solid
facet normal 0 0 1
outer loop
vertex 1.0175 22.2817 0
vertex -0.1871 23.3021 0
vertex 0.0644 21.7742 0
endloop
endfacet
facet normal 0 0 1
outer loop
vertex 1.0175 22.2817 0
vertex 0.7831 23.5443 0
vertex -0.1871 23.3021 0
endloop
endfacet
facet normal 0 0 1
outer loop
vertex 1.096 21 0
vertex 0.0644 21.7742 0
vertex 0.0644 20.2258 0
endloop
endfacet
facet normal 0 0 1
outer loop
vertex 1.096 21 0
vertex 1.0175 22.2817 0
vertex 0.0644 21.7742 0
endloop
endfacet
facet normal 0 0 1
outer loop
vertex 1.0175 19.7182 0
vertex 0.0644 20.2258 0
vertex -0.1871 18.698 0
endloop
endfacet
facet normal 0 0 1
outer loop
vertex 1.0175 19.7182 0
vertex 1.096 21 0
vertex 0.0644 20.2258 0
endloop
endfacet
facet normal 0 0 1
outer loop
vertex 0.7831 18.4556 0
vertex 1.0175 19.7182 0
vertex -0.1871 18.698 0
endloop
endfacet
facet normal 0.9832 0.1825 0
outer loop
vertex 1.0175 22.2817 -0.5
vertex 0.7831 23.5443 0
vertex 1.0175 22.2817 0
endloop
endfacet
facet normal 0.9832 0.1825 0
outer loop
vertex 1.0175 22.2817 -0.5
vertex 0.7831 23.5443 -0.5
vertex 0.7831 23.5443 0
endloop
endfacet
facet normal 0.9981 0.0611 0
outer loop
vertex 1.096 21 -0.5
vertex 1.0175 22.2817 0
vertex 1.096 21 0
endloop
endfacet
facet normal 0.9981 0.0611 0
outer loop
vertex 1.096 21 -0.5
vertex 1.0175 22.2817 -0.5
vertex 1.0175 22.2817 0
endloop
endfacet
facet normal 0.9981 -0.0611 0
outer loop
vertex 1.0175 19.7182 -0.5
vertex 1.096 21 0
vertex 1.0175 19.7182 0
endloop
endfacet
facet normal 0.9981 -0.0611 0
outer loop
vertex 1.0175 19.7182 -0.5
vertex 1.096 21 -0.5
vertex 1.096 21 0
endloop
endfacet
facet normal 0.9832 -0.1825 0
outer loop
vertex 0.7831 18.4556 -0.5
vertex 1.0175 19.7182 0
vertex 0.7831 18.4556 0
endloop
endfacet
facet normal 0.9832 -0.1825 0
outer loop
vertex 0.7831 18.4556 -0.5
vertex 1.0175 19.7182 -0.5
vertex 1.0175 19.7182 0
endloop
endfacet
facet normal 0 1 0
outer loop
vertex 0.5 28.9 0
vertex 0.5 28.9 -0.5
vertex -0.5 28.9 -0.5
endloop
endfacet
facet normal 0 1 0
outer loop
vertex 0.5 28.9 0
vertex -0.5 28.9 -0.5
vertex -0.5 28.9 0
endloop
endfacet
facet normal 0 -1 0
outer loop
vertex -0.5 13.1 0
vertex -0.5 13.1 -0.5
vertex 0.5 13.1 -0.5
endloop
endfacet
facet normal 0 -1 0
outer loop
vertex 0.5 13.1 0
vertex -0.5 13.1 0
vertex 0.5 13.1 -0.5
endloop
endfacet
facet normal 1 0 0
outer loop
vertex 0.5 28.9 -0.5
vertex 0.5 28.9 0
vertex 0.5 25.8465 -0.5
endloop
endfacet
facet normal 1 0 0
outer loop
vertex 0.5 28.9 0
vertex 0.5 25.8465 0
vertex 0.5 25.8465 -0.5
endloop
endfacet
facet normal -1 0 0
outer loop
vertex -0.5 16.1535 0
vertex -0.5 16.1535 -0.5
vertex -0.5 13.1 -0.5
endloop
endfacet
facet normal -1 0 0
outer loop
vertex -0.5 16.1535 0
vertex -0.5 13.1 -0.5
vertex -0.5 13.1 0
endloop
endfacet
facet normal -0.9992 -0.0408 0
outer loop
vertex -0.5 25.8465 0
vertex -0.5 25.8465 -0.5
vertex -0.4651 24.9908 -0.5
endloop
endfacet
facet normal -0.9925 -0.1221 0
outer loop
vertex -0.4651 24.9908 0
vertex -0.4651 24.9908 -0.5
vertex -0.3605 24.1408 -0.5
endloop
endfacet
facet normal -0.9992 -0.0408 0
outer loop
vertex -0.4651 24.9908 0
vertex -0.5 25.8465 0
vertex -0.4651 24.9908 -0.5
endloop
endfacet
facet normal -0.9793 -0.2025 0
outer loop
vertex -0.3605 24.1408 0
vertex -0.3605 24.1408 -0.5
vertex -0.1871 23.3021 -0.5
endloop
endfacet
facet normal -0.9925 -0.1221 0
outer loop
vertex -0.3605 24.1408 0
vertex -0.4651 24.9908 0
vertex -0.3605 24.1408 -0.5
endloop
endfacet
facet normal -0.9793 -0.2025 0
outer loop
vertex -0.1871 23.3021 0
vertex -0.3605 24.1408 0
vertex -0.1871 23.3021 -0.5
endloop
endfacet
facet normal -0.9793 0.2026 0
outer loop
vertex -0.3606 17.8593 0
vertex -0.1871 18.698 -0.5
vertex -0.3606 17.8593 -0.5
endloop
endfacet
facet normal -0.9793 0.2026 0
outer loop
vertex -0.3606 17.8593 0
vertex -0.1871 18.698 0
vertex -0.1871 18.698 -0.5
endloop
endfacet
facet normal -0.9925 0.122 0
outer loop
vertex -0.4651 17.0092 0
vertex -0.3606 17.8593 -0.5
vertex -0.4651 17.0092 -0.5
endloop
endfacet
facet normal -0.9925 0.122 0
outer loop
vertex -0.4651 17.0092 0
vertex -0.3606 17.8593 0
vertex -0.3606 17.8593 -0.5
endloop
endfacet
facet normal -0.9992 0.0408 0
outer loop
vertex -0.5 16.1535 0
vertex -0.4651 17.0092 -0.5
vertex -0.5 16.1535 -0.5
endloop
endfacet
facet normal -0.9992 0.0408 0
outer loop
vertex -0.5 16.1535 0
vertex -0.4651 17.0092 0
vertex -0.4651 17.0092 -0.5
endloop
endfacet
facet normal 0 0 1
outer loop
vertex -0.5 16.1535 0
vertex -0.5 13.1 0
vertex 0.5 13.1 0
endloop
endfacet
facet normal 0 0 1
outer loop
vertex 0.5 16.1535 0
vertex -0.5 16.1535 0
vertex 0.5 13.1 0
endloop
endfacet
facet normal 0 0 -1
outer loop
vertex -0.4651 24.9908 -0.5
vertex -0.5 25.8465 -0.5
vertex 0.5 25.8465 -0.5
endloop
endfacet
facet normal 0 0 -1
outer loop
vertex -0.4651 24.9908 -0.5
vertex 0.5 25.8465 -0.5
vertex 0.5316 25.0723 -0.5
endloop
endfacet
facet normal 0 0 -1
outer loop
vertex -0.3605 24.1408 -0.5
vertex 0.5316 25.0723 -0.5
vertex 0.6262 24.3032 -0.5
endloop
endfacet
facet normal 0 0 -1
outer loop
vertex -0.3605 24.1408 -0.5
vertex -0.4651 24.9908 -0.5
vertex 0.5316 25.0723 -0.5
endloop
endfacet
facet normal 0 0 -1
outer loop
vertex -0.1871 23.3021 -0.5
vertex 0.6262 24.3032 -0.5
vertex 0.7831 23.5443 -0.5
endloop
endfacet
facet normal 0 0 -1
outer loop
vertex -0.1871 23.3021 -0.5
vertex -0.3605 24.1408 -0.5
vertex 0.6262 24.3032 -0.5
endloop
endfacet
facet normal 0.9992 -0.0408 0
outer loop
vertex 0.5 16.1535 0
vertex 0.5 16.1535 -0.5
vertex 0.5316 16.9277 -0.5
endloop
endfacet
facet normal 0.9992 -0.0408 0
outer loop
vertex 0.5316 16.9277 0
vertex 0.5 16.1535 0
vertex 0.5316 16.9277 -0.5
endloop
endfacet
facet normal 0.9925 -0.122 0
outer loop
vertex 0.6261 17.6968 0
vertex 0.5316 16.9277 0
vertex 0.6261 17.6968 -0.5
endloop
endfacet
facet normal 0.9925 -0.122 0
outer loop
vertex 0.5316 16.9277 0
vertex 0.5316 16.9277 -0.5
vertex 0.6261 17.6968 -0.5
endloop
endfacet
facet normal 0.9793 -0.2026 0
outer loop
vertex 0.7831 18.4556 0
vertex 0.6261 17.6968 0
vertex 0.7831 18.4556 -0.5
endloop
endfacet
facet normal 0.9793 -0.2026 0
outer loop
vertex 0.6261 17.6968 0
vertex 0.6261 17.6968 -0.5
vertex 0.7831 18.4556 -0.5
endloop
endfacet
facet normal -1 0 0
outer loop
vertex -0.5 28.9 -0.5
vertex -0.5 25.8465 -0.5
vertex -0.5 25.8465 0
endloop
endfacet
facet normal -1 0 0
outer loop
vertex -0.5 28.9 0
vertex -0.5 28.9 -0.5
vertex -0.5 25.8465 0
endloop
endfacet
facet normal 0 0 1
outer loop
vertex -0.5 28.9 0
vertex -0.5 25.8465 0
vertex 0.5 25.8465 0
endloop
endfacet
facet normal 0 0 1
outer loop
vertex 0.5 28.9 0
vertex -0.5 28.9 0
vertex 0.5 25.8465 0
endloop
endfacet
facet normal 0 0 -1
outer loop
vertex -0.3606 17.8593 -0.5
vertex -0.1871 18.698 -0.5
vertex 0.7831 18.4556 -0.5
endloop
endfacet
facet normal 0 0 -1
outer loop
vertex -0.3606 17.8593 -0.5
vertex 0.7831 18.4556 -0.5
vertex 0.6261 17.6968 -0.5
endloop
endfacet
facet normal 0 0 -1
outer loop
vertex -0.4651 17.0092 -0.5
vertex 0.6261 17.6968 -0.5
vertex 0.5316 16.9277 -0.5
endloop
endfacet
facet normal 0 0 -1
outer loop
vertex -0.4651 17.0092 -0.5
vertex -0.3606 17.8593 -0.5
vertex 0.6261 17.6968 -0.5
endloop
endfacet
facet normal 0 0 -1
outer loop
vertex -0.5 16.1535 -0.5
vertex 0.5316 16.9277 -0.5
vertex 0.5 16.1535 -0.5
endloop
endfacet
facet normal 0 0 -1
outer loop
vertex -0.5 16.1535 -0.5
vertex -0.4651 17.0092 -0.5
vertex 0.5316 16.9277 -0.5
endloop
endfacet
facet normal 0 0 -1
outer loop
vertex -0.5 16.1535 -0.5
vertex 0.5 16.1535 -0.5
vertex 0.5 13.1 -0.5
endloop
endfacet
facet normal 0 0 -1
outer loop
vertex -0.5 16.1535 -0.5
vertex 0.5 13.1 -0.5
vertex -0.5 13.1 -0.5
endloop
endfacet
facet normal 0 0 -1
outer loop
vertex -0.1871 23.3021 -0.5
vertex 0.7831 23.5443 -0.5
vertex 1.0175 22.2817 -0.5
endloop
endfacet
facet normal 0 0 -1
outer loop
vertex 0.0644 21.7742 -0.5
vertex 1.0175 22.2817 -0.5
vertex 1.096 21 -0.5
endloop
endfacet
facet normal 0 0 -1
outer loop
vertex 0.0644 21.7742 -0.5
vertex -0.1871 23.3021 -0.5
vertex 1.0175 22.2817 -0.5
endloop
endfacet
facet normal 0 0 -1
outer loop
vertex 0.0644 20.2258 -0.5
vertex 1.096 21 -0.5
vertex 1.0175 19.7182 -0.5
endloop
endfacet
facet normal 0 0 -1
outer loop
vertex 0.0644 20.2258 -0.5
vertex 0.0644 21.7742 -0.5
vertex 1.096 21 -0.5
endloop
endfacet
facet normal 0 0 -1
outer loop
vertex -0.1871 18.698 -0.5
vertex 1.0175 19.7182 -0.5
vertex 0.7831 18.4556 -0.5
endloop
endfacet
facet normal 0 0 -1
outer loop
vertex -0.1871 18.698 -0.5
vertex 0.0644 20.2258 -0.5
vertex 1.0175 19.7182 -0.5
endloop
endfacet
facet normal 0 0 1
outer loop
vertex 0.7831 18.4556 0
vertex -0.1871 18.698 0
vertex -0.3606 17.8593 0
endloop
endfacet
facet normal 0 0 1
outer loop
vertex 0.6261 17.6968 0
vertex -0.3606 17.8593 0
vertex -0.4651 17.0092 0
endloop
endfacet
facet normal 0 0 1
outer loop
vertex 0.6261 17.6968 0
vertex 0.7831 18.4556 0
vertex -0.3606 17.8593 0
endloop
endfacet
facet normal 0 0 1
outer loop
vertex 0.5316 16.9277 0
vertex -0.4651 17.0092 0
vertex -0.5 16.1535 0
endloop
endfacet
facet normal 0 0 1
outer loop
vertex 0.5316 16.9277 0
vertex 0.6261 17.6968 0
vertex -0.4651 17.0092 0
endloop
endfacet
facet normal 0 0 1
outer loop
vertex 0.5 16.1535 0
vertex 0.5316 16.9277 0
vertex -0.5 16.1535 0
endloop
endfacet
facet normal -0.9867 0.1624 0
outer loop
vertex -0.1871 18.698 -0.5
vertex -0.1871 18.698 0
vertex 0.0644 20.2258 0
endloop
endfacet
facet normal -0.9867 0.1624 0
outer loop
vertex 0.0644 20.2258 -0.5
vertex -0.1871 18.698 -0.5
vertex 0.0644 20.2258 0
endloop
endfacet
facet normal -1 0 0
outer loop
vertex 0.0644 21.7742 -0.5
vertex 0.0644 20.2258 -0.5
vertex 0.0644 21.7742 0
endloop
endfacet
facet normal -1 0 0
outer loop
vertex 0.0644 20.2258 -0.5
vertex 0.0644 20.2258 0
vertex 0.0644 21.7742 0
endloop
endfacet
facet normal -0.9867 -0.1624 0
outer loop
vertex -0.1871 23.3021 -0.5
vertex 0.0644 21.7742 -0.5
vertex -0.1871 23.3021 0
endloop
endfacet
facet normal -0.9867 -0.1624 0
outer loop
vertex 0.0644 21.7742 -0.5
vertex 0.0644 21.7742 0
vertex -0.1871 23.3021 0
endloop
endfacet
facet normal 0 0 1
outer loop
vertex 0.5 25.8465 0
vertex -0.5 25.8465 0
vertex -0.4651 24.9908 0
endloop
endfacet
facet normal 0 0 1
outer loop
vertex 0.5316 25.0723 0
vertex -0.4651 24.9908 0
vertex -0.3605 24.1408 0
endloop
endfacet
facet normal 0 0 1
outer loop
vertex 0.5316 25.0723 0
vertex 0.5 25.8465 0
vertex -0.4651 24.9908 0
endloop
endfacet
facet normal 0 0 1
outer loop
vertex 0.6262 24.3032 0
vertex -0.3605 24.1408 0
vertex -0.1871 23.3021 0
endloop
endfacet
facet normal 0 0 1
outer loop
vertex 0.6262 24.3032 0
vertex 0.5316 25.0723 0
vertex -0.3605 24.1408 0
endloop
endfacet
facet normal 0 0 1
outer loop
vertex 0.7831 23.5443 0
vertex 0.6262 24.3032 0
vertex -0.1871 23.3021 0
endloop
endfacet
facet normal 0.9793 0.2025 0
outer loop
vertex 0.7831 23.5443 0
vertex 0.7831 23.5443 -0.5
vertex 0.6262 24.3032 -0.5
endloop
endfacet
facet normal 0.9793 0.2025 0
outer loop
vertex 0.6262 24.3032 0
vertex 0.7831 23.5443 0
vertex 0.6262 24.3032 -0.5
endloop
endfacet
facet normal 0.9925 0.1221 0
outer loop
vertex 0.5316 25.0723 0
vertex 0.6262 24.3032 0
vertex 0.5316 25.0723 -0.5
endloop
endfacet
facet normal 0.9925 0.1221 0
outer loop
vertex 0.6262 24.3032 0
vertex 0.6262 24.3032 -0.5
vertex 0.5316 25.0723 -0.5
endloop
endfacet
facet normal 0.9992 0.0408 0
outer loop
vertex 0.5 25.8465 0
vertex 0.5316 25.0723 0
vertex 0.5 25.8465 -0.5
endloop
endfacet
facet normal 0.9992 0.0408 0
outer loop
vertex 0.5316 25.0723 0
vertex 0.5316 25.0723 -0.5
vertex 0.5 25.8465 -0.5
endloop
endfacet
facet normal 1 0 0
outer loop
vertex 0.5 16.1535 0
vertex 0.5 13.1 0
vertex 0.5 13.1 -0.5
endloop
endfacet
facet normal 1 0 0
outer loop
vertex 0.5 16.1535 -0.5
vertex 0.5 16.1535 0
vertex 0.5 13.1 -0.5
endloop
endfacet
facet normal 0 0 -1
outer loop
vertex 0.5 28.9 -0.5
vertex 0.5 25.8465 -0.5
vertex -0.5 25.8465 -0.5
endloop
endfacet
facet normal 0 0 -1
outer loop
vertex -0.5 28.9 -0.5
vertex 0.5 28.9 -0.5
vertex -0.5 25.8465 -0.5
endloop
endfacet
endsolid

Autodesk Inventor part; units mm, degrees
ref_plane "YZ Plane" through (0, 0, 0) normal (1, 0, 0) x (0, 1, 0)
ref_plane "XY Plane" through (0, 0, 0) normal (0, 0, 1) x (1, 0, 0)
sketch "Sketch1" plane through (0, 0, 0) normal (0, 0, 1) x (1, 0, 0)
  line L0 (0.9, 49.1) -> (0.9, 28.9) projected
  arc A0 (0.9, 49.1) -> (-0.9, 49.1) centre (0, 49.1) ccw projected
  line L1 (-0.9, 28.9) -> (-0.9, 49.1) projected
  arc A1 (-0.9, 28.9) -> (0.9, 28.9) centre (0, 28.9) ccw projected
  line L2 (0.9, 13.1) -> (0.9, -13.1) projected
  arc A2 (0.9, 13.1) -> (-0.9, 13.1) centre (0, 13.1) ccw projected
  line L3 (-0.9, -13.1) -> (-0.9, 13.1) projected
  arc A3 (-0.9, -13.1) -> (0.9, -13.1) centre (0, -13.1) ccw projected
  line L4 (0, 28.9) -> (0, 25.8465)
  arc A4 (0, 25.8465) -> (0.298, 23.4232) centre (10, 25.8465) ccw
  arc A5 (0.298, 18.5768) -> (0.298, 23.4232) centre (-9.4039, 21) ccw
  arc A6 (0.298, 18.5768) -> (0, 16.1535) centre (10, 16.1535) ccw
  line L5 (0, 16.1535) -> (0, 13.1)
  point P0 (0, 0)
  dimension "d0" = 10
  dimension "d1" = 10
ref_plane "Work Plane1" through (0, 28.9, 0) normal (0, 1, 0) x (-1, 0, 0)
sketch "Sketch2" plane through (0, 28.9, 0) normal (0, 1, 0) x (-1, 0, 0)
  line L0 (-0.5, 0) -> (0.5, 0)
  line L1 (0.5, 0) -> (0.5, -0.5)
  line L2 (0.5, -0.5) -> (-0.5, -0.5)
  line L3 (-0.5, -0.5) -> (-0.5, 0)
  point P0 (0, 0)
  point P1 (0, 0)
  dimension "d2" = 1
  dimension "d3" = 0.5
sweep "Sweep1" add profiles "Sketch2" path "Sketch1" path curves L4 A4 A5 A6 L5
properties part number "connector"
